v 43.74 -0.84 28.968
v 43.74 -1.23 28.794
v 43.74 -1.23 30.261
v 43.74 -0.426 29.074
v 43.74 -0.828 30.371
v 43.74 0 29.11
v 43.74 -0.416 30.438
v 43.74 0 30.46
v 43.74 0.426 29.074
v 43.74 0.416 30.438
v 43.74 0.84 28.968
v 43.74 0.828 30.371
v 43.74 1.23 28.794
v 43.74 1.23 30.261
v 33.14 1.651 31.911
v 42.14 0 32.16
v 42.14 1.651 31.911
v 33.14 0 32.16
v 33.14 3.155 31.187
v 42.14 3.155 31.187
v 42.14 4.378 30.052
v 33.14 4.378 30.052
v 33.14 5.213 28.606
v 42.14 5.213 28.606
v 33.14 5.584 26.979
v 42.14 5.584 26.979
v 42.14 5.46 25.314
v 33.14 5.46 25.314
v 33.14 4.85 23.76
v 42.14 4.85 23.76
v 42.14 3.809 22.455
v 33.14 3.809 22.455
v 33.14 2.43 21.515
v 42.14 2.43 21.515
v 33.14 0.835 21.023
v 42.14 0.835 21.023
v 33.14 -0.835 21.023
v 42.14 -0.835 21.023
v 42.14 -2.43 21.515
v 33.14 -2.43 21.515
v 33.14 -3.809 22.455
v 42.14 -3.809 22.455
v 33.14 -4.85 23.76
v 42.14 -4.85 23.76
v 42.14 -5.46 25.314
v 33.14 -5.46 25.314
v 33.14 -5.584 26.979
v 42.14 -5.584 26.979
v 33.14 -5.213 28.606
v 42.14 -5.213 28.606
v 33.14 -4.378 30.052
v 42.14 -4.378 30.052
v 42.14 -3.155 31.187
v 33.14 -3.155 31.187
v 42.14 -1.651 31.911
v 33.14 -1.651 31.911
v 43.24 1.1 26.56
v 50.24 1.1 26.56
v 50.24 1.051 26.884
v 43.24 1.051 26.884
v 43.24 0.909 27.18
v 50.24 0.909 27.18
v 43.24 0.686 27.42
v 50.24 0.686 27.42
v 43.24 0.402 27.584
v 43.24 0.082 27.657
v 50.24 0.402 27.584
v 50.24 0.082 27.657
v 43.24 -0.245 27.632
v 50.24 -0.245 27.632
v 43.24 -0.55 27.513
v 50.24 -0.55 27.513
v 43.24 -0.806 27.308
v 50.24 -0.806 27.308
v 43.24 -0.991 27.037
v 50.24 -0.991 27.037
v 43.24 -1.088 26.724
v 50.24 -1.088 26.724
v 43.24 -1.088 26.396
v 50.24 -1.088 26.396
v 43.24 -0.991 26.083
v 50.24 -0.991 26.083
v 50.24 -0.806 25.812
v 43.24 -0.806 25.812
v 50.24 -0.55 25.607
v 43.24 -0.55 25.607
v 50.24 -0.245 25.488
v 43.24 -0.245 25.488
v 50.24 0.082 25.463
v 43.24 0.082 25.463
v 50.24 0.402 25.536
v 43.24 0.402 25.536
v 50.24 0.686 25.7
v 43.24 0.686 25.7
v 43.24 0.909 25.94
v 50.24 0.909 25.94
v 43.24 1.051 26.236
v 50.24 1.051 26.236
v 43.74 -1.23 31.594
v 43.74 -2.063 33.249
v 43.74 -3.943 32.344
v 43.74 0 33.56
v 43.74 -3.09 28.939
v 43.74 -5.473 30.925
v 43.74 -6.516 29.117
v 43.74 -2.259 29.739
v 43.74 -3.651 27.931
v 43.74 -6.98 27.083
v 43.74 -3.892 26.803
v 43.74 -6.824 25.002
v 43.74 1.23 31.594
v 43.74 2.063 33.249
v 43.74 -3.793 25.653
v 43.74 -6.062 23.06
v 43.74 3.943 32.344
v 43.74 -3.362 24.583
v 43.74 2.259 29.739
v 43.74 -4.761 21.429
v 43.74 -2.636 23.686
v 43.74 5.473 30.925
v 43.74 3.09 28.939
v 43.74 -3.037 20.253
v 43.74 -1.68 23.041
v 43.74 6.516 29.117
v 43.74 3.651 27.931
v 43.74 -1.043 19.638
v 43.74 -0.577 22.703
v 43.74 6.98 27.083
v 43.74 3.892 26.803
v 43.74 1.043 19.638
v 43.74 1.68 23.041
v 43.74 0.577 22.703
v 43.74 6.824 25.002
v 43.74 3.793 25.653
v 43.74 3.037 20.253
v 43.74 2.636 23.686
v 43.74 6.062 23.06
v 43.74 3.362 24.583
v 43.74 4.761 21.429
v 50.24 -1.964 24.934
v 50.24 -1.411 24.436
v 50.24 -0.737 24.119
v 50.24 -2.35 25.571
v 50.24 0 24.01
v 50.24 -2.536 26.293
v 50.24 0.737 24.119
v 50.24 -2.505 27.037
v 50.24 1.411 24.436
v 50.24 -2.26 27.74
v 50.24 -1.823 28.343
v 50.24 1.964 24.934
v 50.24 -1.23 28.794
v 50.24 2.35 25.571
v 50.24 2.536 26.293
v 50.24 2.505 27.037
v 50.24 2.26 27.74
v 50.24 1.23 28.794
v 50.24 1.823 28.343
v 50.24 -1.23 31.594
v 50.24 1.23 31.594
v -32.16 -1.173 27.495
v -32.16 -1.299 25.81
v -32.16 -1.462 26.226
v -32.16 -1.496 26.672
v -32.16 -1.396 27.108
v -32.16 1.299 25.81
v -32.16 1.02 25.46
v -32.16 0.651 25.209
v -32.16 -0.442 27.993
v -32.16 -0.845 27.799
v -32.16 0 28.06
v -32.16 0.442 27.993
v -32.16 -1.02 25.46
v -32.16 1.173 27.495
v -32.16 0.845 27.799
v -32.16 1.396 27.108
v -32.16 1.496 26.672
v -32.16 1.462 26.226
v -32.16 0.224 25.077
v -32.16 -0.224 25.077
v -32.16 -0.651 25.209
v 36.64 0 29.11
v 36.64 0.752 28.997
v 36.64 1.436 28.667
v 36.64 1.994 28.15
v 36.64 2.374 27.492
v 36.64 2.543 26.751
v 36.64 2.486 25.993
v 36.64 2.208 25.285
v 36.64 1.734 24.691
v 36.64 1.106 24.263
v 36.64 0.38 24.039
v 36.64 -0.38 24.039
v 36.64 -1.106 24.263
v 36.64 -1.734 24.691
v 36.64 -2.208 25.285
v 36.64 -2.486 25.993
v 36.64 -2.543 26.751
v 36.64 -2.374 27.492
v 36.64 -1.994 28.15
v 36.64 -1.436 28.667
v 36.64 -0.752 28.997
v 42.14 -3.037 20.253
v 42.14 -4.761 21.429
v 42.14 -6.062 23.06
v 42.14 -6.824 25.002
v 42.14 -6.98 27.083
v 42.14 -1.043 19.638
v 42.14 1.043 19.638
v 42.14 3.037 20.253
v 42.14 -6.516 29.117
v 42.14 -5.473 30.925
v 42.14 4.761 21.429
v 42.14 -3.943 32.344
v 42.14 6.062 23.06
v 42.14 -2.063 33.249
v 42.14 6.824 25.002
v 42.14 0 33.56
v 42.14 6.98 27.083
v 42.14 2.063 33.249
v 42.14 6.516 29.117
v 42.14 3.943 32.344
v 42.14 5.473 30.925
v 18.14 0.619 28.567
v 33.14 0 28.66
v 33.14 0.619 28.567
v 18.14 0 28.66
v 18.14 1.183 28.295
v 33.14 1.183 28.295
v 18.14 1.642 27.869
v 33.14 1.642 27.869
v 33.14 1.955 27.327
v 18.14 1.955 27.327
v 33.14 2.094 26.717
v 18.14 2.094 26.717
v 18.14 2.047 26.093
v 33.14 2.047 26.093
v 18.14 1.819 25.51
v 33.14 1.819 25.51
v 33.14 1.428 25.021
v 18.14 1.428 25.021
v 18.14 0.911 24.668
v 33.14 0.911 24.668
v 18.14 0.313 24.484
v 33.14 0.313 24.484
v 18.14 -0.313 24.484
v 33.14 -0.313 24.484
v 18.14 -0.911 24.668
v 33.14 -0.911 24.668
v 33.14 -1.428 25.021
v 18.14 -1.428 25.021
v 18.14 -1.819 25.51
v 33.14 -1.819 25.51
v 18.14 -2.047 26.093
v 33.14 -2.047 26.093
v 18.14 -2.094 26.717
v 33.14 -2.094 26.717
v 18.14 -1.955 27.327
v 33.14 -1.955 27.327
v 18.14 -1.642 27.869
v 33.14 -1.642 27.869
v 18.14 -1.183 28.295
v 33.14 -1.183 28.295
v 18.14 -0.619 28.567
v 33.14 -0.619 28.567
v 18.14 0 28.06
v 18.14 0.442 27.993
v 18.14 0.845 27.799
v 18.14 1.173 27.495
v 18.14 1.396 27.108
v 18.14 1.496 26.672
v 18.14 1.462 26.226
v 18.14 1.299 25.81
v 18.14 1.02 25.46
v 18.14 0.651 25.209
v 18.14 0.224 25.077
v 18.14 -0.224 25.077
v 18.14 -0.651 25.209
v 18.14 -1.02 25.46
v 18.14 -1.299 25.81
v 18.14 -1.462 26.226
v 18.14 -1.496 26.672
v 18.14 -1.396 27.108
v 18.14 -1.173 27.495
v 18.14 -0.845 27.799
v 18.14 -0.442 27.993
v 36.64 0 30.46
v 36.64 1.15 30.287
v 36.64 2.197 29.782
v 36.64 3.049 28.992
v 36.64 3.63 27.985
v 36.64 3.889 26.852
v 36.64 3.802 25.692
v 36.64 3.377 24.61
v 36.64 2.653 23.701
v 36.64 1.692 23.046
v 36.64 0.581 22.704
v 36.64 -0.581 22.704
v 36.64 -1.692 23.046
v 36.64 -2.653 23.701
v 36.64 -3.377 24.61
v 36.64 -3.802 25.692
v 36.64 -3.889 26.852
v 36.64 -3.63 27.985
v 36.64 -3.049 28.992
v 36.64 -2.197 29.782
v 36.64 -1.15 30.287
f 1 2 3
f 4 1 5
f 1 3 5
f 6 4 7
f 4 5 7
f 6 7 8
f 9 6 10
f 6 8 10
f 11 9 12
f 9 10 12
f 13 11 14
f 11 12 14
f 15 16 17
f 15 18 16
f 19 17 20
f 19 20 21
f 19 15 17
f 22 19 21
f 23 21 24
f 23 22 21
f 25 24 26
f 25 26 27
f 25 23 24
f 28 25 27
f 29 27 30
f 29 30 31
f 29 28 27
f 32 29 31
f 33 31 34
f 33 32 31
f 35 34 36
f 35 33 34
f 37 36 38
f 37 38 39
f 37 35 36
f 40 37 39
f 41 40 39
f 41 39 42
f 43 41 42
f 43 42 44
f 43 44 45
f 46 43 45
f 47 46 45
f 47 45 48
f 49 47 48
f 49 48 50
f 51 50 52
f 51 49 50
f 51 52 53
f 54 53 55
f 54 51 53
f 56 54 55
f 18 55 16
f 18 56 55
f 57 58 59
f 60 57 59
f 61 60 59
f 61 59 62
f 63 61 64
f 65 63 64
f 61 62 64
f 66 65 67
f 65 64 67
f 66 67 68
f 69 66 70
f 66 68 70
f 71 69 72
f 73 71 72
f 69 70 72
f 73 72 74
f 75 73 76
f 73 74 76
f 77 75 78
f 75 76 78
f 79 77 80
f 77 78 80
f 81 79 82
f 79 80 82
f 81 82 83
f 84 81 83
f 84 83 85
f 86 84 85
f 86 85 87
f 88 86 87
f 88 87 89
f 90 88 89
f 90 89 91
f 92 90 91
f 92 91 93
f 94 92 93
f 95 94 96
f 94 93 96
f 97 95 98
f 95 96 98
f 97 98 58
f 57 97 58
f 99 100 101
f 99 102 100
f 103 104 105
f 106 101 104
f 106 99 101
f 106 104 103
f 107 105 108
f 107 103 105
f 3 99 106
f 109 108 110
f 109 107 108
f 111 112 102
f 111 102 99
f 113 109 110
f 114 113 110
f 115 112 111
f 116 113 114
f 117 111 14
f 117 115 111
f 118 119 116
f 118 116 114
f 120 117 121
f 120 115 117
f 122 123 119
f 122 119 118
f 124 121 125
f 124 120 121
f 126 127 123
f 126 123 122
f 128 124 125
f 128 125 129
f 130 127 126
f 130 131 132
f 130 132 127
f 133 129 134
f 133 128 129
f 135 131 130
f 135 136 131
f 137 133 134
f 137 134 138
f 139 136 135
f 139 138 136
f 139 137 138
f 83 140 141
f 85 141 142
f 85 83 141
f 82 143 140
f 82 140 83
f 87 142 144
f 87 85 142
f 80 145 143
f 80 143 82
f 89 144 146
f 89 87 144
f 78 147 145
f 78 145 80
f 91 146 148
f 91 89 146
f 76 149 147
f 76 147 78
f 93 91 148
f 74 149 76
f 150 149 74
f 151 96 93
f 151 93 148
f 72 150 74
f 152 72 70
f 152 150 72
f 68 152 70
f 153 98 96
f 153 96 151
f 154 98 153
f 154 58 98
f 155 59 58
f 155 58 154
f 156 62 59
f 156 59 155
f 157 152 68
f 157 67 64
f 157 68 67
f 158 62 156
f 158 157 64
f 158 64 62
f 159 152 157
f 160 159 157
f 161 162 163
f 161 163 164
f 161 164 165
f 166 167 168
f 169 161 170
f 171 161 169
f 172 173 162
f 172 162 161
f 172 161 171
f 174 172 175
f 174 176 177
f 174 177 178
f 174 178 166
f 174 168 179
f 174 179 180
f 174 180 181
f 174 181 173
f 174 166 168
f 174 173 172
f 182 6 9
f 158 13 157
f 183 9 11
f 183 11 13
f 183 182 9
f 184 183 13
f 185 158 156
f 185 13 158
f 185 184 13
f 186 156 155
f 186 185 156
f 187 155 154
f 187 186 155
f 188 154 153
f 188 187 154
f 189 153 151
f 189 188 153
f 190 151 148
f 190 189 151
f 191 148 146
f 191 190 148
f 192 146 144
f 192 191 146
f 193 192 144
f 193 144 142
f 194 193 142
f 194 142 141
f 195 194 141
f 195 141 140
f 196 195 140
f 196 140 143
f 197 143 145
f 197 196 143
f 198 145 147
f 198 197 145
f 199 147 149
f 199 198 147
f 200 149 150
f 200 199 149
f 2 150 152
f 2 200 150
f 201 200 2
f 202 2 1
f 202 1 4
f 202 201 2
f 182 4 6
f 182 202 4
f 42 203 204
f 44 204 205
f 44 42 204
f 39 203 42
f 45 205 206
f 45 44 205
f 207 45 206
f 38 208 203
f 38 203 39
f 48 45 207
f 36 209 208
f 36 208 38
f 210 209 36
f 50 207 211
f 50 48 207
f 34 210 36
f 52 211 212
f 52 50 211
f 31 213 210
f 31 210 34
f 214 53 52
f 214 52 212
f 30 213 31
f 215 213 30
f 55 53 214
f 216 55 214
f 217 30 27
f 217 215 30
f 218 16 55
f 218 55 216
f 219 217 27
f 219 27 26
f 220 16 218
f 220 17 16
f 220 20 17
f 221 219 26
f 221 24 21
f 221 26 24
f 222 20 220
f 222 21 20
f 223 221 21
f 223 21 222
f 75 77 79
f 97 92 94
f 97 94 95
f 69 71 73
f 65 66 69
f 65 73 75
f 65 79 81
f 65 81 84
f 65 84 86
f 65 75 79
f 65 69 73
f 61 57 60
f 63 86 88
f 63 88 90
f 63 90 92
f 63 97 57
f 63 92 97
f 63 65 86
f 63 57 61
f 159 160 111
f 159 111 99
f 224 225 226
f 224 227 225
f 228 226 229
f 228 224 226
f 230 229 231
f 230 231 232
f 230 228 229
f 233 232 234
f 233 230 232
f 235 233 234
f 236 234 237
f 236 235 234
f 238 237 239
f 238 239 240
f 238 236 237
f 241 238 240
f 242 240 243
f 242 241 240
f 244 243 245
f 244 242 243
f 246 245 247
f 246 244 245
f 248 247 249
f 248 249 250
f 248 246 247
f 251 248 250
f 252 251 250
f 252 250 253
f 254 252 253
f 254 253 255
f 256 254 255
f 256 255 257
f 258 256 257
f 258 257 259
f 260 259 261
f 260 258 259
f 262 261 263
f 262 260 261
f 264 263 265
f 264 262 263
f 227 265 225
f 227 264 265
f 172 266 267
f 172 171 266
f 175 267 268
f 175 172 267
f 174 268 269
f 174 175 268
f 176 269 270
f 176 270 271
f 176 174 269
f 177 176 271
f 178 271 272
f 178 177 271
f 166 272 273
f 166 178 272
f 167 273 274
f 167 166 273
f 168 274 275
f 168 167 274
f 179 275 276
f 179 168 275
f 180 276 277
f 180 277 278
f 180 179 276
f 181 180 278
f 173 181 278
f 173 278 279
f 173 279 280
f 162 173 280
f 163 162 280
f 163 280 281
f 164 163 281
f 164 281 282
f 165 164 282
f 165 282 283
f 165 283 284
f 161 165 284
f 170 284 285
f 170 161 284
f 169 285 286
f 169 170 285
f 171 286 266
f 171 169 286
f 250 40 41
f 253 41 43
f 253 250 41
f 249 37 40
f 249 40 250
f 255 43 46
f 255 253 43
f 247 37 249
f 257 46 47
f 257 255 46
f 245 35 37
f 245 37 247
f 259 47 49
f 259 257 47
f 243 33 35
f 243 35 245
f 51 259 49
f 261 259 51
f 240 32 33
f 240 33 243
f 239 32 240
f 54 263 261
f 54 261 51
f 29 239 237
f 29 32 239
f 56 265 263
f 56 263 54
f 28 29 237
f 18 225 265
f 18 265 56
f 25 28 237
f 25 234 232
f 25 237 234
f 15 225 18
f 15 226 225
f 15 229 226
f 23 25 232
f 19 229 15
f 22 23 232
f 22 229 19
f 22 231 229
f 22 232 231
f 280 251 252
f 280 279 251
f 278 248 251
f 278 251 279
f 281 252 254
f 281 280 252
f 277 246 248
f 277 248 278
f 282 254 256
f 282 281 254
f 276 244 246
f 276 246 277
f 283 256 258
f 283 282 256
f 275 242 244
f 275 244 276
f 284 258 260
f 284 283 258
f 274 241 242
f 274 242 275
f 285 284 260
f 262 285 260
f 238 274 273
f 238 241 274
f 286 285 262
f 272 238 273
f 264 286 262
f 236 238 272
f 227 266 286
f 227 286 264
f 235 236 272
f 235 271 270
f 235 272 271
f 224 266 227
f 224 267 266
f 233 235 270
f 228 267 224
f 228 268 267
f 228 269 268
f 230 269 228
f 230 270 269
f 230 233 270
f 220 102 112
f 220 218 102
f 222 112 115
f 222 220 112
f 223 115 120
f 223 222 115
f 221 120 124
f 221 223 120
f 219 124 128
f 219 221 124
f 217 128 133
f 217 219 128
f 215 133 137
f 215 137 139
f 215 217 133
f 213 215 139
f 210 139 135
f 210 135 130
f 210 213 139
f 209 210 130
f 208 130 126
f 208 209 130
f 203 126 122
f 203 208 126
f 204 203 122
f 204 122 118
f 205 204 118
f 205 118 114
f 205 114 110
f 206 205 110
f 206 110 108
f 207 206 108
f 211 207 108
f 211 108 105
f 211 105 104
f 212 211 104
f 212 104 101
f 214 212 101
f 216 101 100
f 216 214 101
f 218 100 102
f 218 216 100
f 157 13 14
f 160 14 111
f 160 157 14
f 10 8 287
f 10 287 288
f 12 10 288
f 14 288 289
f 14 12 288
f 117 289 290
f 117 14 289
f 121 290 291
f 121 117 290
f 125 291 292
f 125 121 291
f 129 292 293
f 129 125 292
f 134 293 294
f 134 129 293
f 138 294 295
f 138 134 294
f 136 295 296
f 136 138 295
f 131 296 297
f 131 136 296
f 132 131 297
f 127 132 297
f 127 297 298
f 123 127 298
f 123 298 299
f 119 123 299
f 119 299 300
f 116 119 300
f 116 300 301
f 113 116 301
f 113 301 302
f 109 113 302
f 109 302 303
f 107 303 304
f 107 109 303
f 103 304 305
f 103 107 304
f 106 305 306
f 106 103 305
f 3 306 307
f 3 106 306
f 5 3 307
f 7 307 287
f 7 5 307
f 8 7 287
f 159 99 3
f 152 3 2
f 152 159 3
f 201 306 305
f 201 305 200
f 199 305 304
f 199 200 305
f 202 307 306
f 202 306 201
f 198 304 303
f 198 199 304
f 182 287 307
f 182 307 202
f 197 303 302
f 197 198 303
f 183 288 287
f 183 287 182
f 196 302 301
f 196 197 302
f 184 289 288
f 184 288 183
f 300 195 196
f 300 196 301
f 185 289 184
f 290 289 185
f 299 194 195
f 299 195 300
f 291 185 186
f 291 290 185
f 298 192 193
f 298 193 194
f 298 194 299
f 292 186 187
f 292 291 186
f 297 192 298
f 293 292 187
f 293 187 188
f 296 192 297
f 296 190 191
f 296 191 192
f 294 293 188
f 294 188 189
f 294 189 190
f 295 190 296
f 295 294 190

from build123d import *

# Parameters (mm, degrees)
F2_R     = 1.1
F3_DEPTH = 7
F5_DEPTH = 6.5


with BuildPart() as f1:
    # F0 (on Front) → F1 (revolve)
    with BuildSketch(Plane.XZ):
        Polygon((18.140339697, 28.0600738525), (-32.159660303, 28.0600738525), (-32.159660303, 26.5600738525), (50.240339697, 26.5600738525), (50.240339697, 29.1100738525), (36.640339697, 29.1100738525), (36.640339697, 30.4600738525), (43.740339697, 30.4600738525), (43.740339697, 33.5600738525), (42.140339697, 33.5600738525), (42.140339697, 32.1600738525), (33.140339697, 32.1600738525), (33.140339697, 28.6600738525), (18.140339697, 28.6600738525), align=None)
    revolve(axis=Axis((9.040339697, 0, 26.5600738525), (-1, 0, 0)))

    # F2 (on face) → F3 (cut)
    with BuildSketch(Plane.YZ.offset(50.240339697)):
        with Locations((0, 26.5600738525)):
            Circle(F2_R)
    extrude(amount=-F3_DEPTH, mode=Mode.SUBTRACT)

    # F4 (on face) → F5 (join, through all)
    with BuildSketch(Plane.YZ.offset(50.240339697)):
        with BuildLine():
            Line((-1.23, 31.5938151088), (-1.23, 28.7938151088))
            ThreePointArc((-1.23, 28.7938151088), (0, 29.1100738525), (1.23, 28.7938151088))
            Line((1.23, 28.7938151088), (1.23, 31.5938151088))
            Line((1.23, 31.5938151088), (-1.23, 31.5938151088))
        make_face()
    extrude(amount=-F5_DEPTH)


solid = f1.part
